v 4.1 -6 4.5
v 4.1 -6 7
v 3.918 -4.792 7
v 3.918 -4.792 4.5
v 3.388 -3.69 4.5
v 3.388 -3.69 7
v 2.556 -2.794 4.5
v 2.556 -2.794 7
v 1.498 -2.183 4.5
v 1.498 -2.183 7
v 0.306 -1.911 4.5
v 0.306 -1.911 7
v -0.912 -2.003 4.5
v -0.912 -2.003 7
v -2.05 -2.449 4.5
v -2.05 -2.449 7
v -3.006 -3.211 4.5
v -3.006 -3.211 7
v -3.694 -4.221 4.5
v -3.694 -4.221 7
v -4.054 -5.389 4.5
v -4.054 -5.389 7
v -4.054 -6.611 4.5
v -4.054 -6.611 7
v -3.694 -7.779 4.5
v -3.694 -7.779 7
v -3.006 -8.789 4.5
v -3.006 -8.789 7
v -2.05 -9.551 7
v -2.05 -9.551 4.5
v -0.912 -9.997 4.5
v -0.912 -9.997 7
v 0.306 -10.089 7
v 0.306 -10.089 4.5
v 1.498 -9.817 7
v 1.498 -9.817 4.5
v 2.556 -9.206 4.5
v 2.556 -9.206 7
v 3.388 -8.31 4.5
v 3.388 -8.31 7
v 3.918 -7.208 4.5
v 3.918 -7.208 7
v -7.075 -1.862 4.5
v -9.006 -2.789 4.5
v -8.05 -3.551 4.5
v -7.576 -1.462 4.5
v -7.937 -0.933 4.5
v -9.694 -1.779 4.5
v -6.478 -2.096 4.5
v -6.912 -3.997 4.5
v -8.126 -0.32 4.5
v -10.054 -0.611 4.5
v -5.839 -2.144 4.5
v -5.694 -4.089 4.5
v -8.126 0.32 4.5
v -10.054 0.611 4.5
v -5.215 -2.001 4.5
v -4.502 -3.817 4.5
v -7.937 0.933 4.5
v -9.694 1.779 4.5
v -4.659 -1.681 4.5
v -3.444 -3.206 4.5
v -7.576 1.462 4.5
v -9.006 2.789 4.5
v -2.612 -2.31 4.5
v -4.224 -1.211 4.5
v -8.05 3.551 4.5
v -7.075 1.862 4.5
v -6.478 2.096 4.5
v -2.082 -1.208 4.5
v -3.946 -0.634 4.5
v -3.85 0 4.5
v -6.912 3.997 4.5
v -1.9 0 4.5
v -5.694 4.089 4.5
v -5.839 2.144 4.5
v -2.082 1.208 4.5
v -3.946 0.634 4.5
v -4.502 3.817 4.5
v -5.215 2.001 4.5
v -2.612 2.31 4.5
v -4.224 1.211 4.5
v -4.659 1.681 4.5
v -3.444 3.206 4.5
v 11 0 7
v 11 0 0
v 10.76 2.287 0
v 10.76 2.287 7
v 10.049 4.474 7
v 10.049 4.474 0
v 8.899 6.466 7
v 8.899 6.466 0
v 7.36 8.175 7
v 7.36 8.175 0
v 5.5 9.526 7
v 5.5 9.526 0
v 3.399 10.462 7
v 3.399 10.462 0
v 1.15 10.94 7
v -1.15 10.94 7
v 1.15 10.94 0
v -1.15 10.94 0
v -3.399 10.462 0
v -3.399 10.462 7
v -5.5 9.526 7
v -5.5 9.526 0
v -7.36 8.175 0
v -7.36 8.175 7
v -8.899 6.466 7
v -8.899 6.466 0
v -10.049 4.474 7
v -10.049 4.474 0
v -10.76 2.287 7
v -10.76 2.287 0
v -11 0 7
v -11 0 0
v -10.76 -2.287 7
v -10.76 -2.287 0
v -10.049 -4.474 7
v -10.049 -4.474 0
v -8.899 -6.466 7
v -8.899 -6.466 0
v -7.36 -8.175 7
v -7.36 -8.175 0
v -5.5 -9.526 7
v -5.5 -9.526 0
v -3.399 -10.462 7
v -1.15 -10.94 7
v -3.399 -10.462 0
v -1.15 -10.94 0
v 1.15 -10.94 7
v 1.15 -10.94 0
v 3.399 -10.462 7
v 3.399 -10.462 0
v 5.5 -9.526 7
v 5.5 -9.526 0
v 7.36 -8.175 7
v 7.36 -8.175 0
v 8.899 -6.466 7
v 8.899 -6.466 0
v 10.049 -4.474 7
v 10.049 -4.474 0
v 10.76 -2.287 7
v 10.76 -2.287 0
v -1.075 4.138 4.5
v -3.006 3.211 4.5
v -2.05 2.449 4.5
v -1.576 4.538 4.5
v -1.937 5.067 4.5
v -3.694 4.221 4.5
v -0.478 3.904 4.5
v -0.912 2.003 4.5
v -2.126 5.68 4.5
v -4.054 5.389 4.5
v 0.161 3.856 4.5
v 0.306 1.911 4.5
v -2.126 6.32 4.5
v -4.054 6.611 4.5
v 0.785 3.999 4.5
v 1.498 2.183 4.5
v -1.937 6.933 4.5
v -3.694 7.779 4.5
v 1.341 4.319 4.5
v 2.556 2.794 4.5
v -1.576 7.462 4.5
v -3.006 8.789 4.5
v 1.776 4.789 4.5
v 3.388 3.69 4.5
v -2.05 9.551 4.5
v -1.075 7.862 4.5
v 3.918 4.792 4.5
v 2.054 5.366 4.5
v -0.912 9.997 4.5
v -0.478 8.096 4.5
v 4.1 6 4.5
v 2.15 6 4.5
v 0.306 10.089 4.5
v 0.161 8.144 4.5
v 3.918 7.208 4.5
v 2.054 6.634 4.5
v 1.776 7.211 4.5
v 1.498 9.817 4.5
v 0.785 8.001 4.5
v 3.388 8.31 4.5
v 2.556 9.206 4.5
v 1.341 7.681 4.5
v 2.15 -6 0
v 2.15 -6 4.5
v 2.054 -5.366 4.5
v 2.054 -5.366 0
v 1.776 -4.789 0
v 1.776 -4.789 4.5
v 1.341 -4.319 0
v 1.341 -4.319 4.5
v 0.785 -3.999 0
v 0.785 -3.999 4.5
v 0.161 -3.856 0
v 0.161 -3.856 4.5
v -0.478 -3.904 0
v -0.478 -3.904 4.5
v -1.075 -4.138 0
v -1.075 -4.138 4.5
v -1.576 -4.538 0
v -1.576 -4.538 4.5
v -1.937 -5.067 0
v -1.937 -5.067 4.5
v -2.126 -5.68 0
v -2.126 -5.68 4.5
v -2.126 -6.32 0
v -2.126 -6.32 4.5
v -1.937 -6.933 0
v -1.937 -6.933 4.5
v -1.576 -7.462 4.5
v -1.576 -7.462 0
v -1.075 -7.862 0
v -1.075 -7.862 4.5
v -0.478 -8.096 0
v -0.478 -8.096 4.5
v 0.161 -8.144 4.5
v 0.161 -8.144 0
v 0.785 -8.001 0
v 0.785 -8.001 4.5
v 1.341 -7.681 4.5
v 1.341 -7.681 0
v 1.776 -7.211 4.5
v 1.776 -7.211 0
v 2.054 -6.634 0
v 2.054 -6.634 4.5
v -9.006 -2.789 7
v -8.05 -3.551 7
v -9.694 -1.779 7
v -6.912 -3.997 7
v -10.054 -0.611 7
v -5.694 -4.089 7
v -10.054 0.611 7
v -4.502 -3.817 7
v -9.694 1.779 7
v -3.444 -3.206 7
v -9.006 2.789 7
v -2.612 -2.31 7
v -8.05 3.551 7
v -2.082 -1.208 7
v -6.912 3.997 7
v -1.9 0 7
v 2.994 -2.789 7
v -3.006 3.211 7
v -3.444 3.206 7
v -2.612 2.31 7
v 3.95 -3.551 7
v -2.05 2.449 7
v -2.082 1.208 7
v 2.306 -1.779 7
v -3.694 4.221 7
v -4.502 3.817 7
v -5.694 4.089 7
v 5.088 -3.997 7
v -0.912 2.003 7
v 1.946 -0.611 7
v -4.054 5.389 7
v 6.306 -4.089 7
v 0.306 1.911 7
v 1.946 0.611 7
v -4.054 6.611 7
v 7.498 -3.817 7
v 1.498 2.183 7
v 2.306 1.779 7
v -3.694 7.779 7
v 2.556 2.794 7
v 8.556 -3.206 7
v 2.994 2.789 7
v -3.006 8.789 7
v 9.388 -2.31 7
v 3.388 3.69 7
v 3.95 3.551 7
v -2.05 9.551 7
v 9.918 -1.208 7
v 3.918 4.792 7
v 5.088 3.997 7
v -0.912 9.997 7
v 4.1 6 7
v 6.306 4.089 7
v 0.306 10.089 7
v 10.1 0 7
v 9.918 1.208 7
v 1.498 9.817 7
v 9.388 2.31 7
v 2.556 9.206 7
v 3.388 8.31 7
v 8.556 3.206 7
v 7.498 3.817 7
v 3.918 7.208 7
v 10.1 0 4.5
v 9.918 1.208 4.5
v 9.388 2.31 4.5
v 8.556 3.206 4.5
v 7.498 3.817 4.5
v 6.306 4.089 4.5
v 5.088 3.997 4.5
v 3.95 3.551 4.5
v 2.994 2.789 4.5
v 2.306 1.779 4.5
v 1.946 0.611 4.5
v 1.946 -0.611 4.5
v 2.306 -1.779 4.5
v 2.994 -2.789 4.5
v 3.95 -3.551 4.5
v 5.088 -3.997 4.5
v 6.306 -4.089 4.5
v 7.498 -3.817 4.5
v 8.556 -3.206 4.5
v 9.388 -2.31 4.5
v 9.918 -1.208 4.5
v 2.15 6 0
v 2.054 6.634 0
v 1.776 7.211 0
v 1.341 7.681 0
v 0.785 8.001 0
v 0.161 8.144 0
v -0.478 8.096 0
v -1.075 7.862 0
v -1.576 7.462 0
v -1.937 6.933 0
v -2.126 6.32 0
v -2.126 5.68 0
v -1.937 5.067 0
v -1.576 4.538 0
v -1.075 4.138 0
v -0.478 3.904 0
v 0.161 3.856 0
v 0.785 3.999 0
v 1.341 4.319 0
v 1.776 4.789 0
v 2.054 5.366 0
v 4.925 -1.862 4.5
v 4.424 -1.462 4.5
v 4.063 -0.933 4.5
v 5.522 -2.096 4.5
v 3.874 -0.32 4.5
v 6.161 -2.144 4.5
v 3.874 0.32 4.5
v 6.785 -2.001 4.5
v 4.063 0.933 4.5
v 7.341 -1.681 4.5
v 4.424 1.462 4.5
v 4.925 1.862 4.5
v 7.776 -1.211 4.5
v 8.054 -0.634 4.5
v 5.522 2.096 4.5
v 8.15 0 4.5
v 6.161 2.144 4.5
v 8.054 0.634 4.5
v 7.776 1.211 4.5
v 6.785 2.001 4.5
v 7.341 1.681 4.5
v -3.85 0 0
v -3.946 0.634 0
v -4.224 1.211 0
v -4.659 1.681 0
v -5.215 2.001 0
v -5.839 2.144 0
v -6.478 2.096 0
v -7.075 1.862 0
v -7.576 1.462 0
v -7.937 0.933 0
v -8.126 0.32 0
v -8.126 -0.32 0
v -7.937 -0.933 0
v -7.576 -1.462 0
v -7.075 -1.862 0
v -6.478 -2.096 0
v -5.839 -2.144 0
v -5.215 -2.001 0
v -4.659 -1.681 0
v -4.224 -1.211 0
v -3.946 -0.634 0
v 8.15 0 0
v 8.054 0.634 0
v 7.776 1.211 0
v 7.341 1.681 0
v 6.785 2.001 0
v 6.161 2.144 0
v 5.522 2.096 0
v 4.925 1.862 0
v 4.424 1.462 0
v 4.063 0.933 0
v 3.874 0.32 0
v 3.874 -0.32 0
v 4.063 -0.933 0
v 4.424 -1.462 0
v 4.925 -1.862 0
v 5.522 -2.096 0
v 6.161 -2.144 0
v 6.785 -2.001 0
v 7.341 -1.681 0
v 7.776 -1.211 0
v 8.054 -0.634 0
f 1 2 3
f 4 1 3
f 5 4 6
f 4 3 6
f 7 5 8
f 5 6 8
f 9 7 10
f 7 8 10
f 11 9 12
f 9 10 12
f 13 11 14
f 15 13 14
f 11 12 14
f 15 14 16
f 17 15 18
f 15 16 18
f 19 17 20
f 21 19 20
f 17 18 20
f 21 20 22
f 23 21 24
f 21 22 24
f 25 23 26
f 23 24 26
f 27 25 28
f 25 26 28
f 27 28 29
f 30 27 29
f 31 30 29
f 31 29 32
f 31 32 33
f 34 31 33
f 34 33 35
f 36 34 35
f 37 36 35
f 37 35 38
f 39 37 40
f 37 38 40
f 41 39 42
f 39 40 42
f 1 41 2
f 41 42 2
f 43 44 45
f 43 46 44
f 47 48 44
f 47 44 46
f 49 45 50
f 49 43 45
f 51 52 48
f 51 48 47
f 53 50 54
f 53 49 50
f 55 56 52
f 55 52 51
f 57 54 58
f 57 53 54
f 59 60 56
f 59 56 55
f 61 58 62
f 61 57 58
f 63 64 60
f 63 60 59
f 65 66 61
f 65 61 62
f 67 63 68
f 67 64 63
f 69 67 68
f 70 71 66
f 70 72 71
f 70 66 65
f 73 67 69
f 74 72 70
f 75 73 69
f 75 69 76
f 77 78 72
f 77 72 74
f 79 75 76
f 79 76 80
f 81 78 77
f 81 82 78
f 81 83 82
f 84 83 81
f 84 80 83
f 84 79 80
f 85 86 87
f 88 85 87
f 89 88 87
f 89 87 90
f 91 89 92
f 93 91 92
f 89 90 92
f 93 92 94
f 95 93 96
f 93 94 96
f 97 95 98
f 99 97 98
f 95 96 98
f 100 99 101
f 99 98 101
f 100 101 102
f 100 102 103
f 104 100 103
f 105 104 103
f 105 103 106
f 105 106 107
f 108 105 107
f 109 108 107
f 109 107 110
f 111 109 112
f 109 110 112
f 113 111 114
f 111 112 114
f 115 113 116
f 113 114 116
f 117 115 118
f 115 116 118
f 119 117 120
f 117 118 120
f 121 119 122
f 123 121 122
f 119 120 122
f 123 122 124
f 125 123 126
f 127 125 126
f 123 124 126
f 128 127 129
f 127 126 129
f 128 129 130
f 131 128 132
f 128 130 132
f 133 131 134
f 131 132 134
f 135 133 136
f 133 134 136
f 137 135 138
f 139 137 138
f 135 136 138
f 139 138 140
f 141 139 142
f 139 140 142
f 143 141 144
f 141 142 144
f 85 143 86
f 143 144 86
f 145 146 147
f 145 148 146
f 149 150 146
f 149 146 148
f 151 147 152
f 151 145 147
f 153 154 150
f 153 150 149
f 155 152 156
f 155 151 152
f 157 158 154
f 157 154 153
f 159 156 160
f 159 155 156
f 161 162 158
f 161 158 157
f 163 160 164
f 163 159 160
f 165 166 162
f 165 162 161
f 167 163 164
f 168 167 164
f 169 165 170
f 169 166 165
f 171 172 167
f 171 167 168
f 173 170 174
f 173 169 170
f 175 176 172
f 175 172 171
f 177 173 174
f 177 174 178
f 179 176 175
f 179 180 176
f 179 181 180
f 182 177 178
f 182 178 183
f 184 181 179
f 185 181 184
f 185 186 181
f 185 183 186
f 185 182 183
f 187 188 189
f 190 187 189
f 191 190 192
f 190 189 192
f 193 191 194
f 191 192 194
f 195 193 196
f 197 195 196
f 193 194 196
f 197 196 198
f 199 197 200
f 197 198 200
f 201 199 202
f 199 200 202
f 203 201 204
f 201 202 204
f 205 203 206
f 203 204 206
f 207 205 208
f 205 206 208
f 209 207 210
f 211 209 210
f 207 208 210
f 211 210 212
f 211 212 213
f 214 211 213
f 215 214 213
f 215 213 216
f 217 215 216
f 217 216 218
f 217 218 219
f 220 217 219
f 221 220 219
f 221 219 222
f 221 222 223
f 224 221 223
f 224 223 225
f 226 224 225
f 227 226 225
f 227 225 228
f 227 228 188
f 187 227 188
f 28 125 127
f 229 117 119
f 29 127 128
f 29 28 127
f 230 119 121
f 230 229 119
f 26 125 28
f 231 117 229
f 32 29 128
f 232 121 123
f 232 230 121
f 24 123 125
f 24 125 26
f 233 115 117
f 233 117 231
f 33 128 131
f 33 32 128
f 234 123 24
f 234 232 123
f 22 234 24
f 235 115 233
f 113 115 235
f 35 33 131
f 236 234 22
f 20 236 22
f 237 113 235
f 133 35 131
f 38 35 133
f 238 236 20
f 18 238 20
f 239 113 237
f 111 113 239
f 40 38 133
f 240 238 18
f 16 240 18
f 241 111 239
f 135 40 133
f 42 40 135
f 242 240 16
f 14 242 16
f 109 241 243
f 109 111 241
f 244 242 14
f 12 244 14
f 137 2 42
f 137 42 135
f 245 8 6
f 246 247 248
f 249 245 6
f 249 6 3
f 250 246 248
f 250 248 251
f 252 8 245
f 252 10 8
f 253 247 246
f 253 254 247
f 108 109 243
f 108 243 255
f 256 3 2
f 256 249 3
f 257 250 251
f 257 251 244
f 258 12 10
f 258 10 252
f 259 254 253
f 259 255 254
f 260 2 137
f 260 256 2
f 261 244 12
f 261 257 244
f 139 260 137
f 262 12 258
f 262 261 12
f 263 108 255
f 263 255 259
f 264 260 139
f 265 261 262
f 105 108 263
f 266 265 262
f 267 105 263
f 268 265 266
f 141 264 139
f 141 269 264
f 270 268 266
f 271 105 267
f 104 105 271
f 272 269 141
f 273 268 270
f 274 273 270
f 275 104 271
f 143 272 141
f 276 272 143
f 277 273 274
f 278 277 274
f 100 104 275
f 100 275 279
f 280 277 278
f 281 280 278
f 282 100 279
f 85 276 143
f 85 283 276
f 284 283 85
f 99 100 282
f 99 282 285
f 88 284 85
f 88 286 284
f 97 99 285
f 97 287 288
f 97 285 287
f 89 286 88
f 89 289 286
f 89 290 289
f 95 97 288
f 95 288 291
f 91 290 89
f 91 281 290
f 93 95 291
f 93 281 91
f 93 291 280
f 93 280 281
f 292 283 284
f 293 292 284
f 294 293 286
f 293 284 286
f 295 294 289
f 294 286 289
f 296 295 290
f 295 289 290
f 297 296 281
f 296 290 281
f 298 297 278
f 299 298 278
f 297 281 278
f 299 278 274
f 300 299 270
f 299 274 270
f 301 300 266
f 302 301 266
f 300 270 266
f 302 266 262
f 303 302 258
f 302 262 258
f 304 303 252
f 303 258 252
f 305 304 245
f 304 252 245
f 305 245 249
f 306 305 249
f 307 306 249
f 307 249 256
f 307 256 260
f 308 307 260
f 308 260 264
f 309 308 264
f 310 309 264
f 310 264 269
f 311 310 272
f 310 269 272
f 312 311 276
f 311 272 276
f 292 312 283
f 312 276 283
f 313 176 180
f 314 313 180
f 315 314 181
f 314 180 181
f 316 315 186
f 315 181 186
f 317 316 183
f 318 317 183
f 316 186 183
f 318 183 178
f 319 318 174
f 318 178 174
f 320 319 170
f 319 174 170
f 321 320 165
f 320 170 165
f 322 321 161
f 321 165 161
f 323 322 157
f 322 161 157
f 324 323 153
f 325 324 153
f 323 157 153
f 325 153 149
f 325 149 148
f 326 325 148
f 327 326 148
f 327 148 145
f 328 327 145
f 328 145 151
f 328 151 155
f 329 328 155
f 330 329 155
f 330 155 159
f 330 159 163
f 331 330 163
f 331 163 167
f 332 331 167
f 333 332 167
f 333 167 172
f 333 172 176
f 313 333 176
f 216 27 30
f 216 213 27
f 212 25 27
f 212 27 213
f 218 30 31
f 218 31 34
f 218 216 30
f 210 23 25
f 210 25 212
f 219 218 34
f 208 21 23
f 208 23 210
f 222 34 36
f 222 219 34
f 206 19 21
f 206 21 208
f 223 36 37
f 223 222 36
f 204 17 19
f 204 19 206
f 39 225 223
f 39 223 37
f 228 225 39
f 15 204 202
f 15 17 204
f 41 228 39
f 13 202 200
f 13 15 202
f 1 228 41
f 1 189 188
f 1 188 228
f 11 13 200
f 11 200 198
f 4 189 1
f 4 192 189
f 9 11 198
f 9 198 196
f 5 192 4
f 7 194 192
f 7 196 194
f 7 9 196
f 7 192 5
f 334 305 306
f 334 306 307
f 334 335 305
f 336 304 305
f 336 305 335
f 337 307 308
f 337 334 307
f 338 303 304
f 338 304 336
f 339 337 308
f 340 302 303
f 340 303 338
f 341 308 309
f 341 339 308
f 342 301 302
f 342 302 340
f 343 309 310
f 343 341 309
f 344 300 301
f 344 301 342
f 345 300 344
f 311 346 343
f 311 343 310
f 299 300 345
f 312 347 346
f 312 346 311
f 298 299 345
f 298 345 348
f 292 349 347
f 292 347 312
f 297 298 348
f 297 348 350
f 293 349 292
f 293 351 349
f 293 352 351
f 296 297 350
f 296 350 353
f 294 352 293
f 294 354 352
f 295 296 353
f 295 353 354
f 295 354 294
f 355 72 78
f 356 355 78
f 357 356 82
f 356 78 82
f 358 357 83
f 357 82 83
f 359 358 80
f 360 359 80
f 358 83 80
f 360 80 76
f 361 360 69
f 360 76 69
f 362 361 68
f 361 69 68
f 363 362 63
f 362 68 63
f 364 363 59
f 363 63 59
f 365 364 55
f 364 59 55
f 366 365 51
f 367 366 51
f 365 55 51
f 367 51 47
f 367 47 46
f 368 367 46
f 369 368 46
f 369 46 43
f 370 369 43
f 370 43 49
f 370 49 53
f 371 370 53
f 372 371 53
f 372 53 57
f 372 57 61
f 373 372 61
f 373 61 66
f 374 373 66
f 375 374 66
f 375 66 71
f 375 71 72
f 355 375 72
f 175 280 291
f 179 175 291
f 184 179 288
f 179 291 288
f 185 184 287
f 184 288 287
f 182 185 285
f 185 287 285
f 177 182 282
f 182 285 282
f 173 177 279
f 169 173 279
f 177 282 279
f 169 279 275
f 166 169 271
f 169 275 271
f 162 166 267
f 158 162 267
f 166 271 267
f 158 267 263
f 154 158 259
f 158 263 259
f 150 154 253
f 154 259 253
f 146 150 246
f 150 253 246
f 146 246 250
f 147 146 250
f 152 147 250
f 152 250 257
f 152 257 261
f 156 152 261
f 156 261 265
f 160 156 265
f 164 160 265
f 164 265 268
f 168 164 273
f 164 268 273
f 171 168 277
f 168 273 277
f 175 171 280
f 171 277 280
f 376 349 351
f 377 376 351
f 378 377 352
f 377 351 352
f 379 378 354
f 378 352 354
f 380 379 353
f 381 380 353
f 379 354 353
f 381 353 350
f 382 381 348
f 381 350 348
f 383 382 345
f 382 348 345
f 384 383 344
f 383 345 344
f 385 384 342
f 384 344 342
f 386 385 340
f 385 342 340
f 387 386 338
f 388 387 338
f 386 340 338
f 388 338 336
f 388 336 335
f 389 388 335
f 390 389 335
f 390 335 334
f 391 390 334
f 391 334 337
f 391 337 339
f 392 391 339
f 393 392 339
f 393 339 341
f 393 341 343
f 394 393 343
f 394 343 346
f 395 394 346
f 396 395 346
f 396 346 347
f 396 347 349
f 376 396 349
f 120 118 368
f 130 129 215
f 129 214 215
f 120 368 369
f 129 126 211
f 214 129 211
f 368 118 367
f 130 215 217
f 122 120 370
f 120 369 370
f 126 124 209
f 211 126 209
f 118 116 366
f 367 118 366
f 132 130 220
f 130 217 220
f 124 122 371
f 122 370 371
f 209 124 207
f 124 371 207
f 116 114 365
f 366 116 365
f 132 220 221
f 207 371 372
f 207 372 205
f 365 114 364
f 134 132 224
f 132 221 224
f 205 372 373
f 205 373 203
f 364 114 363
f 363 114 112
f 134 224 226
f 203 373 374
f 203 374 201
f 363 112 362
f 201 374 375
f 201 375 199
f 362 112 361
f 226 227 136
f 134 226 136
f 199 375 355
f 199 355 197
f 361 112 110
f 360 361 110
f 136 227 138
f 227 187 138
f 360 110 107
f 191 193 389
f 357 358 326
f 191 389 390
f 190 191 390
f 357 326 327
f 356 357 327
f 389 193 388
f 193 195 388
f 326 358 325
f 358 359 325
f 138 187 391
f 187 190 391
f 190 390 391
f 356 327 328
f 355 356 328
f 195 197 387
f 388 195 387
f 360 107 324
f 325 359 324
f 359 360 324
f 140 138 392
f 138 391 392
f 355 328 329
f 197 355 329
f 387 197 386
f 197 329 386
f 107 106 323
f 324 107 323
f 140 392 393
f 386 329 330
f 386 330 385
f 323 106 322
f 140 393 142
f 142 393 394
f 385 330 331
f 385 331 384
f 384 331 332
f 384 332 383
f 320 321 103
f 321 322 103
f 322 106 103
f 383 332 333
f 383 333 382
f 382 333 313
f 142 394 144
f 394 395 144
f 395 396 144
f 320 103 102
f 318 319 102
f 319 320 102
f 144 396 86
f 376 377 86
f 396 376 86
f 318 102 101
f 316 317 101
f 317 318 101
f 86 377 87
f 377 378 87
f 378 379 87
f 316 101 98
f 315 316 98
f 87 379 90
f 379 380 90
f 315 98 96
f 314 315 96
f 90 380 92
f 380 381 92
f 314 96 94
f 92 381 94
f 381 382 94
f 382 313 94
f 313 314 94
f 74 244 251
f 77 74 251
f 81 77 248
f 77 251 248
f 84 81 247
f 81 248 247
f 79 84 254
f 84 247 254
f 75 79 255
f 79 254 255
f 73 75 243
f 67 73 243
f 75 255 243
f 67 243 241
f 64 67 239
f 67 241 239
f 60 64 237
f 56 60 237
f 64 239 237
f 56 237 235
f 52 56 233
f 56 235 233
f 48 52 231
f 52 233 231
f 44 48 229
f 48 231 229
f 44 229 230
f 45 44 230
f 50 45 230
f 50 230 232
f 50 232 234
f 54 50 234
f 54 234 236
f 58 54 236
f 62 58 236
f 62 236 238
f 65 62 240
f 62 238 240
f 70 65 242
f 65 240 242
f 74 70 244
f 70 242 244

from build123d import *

# Parameters (mm, degrees)
SKETCH1_R           = 11
BOSS_EXTRUDE1_DEPTH = 7
SKETCH2_R           = 4.1
CUT_EXTRUDE1_DEPTH  = 2.5
SKETCH3_R           = 2.15
CUT_EXTRUDE2_DEPTH  = 10


with BuildPart() as part:
    # Sketch1 → Boss-Extrude1 (new body)
    with BuildSketch(Plane.XY):
        Circle(SKETCH1_R)
    extrude(amount=BOSS_EXTRUDE1_DEPTH)

    # Sketch2 → Cut-Extrude1 (cut)
    with BuildSketch(Plane.XY.offset(7)):
        with Locations((0, 6)):
            Circle(SKETCH2_R)
        with Locations((6, 0)):
            Circle(SKETCH2_R)
        with Locations((0, -6)):
            Circle(SKETCH2_R)
        with Locations((-6, 0)):
            Circle(SKETCH2_R)
    extrude(amount=-CUT_EXTRUDE1_DEPTH, mode=Mode.SUBTRACT)

    # Sketch3 → Cut-Extrude2 (cut)
    with BuildSketch(Plane.XY.offset(4.5)):
        with Locations((0, -6)):
            Circle(SKETCH3_R)
        with Locations((-6, 0)):
            Circle(SKETCH3_R)
        with Locations((0, 6)):
            Circle(SKETCH3_R)
        with Locations((6, 0)):
            Circle(SKETCH3_R)
    extrude(amount=-CUT_EXTRUDE2_DEPTH, mode=Mode.SUBTRACT)


solid = part.part
